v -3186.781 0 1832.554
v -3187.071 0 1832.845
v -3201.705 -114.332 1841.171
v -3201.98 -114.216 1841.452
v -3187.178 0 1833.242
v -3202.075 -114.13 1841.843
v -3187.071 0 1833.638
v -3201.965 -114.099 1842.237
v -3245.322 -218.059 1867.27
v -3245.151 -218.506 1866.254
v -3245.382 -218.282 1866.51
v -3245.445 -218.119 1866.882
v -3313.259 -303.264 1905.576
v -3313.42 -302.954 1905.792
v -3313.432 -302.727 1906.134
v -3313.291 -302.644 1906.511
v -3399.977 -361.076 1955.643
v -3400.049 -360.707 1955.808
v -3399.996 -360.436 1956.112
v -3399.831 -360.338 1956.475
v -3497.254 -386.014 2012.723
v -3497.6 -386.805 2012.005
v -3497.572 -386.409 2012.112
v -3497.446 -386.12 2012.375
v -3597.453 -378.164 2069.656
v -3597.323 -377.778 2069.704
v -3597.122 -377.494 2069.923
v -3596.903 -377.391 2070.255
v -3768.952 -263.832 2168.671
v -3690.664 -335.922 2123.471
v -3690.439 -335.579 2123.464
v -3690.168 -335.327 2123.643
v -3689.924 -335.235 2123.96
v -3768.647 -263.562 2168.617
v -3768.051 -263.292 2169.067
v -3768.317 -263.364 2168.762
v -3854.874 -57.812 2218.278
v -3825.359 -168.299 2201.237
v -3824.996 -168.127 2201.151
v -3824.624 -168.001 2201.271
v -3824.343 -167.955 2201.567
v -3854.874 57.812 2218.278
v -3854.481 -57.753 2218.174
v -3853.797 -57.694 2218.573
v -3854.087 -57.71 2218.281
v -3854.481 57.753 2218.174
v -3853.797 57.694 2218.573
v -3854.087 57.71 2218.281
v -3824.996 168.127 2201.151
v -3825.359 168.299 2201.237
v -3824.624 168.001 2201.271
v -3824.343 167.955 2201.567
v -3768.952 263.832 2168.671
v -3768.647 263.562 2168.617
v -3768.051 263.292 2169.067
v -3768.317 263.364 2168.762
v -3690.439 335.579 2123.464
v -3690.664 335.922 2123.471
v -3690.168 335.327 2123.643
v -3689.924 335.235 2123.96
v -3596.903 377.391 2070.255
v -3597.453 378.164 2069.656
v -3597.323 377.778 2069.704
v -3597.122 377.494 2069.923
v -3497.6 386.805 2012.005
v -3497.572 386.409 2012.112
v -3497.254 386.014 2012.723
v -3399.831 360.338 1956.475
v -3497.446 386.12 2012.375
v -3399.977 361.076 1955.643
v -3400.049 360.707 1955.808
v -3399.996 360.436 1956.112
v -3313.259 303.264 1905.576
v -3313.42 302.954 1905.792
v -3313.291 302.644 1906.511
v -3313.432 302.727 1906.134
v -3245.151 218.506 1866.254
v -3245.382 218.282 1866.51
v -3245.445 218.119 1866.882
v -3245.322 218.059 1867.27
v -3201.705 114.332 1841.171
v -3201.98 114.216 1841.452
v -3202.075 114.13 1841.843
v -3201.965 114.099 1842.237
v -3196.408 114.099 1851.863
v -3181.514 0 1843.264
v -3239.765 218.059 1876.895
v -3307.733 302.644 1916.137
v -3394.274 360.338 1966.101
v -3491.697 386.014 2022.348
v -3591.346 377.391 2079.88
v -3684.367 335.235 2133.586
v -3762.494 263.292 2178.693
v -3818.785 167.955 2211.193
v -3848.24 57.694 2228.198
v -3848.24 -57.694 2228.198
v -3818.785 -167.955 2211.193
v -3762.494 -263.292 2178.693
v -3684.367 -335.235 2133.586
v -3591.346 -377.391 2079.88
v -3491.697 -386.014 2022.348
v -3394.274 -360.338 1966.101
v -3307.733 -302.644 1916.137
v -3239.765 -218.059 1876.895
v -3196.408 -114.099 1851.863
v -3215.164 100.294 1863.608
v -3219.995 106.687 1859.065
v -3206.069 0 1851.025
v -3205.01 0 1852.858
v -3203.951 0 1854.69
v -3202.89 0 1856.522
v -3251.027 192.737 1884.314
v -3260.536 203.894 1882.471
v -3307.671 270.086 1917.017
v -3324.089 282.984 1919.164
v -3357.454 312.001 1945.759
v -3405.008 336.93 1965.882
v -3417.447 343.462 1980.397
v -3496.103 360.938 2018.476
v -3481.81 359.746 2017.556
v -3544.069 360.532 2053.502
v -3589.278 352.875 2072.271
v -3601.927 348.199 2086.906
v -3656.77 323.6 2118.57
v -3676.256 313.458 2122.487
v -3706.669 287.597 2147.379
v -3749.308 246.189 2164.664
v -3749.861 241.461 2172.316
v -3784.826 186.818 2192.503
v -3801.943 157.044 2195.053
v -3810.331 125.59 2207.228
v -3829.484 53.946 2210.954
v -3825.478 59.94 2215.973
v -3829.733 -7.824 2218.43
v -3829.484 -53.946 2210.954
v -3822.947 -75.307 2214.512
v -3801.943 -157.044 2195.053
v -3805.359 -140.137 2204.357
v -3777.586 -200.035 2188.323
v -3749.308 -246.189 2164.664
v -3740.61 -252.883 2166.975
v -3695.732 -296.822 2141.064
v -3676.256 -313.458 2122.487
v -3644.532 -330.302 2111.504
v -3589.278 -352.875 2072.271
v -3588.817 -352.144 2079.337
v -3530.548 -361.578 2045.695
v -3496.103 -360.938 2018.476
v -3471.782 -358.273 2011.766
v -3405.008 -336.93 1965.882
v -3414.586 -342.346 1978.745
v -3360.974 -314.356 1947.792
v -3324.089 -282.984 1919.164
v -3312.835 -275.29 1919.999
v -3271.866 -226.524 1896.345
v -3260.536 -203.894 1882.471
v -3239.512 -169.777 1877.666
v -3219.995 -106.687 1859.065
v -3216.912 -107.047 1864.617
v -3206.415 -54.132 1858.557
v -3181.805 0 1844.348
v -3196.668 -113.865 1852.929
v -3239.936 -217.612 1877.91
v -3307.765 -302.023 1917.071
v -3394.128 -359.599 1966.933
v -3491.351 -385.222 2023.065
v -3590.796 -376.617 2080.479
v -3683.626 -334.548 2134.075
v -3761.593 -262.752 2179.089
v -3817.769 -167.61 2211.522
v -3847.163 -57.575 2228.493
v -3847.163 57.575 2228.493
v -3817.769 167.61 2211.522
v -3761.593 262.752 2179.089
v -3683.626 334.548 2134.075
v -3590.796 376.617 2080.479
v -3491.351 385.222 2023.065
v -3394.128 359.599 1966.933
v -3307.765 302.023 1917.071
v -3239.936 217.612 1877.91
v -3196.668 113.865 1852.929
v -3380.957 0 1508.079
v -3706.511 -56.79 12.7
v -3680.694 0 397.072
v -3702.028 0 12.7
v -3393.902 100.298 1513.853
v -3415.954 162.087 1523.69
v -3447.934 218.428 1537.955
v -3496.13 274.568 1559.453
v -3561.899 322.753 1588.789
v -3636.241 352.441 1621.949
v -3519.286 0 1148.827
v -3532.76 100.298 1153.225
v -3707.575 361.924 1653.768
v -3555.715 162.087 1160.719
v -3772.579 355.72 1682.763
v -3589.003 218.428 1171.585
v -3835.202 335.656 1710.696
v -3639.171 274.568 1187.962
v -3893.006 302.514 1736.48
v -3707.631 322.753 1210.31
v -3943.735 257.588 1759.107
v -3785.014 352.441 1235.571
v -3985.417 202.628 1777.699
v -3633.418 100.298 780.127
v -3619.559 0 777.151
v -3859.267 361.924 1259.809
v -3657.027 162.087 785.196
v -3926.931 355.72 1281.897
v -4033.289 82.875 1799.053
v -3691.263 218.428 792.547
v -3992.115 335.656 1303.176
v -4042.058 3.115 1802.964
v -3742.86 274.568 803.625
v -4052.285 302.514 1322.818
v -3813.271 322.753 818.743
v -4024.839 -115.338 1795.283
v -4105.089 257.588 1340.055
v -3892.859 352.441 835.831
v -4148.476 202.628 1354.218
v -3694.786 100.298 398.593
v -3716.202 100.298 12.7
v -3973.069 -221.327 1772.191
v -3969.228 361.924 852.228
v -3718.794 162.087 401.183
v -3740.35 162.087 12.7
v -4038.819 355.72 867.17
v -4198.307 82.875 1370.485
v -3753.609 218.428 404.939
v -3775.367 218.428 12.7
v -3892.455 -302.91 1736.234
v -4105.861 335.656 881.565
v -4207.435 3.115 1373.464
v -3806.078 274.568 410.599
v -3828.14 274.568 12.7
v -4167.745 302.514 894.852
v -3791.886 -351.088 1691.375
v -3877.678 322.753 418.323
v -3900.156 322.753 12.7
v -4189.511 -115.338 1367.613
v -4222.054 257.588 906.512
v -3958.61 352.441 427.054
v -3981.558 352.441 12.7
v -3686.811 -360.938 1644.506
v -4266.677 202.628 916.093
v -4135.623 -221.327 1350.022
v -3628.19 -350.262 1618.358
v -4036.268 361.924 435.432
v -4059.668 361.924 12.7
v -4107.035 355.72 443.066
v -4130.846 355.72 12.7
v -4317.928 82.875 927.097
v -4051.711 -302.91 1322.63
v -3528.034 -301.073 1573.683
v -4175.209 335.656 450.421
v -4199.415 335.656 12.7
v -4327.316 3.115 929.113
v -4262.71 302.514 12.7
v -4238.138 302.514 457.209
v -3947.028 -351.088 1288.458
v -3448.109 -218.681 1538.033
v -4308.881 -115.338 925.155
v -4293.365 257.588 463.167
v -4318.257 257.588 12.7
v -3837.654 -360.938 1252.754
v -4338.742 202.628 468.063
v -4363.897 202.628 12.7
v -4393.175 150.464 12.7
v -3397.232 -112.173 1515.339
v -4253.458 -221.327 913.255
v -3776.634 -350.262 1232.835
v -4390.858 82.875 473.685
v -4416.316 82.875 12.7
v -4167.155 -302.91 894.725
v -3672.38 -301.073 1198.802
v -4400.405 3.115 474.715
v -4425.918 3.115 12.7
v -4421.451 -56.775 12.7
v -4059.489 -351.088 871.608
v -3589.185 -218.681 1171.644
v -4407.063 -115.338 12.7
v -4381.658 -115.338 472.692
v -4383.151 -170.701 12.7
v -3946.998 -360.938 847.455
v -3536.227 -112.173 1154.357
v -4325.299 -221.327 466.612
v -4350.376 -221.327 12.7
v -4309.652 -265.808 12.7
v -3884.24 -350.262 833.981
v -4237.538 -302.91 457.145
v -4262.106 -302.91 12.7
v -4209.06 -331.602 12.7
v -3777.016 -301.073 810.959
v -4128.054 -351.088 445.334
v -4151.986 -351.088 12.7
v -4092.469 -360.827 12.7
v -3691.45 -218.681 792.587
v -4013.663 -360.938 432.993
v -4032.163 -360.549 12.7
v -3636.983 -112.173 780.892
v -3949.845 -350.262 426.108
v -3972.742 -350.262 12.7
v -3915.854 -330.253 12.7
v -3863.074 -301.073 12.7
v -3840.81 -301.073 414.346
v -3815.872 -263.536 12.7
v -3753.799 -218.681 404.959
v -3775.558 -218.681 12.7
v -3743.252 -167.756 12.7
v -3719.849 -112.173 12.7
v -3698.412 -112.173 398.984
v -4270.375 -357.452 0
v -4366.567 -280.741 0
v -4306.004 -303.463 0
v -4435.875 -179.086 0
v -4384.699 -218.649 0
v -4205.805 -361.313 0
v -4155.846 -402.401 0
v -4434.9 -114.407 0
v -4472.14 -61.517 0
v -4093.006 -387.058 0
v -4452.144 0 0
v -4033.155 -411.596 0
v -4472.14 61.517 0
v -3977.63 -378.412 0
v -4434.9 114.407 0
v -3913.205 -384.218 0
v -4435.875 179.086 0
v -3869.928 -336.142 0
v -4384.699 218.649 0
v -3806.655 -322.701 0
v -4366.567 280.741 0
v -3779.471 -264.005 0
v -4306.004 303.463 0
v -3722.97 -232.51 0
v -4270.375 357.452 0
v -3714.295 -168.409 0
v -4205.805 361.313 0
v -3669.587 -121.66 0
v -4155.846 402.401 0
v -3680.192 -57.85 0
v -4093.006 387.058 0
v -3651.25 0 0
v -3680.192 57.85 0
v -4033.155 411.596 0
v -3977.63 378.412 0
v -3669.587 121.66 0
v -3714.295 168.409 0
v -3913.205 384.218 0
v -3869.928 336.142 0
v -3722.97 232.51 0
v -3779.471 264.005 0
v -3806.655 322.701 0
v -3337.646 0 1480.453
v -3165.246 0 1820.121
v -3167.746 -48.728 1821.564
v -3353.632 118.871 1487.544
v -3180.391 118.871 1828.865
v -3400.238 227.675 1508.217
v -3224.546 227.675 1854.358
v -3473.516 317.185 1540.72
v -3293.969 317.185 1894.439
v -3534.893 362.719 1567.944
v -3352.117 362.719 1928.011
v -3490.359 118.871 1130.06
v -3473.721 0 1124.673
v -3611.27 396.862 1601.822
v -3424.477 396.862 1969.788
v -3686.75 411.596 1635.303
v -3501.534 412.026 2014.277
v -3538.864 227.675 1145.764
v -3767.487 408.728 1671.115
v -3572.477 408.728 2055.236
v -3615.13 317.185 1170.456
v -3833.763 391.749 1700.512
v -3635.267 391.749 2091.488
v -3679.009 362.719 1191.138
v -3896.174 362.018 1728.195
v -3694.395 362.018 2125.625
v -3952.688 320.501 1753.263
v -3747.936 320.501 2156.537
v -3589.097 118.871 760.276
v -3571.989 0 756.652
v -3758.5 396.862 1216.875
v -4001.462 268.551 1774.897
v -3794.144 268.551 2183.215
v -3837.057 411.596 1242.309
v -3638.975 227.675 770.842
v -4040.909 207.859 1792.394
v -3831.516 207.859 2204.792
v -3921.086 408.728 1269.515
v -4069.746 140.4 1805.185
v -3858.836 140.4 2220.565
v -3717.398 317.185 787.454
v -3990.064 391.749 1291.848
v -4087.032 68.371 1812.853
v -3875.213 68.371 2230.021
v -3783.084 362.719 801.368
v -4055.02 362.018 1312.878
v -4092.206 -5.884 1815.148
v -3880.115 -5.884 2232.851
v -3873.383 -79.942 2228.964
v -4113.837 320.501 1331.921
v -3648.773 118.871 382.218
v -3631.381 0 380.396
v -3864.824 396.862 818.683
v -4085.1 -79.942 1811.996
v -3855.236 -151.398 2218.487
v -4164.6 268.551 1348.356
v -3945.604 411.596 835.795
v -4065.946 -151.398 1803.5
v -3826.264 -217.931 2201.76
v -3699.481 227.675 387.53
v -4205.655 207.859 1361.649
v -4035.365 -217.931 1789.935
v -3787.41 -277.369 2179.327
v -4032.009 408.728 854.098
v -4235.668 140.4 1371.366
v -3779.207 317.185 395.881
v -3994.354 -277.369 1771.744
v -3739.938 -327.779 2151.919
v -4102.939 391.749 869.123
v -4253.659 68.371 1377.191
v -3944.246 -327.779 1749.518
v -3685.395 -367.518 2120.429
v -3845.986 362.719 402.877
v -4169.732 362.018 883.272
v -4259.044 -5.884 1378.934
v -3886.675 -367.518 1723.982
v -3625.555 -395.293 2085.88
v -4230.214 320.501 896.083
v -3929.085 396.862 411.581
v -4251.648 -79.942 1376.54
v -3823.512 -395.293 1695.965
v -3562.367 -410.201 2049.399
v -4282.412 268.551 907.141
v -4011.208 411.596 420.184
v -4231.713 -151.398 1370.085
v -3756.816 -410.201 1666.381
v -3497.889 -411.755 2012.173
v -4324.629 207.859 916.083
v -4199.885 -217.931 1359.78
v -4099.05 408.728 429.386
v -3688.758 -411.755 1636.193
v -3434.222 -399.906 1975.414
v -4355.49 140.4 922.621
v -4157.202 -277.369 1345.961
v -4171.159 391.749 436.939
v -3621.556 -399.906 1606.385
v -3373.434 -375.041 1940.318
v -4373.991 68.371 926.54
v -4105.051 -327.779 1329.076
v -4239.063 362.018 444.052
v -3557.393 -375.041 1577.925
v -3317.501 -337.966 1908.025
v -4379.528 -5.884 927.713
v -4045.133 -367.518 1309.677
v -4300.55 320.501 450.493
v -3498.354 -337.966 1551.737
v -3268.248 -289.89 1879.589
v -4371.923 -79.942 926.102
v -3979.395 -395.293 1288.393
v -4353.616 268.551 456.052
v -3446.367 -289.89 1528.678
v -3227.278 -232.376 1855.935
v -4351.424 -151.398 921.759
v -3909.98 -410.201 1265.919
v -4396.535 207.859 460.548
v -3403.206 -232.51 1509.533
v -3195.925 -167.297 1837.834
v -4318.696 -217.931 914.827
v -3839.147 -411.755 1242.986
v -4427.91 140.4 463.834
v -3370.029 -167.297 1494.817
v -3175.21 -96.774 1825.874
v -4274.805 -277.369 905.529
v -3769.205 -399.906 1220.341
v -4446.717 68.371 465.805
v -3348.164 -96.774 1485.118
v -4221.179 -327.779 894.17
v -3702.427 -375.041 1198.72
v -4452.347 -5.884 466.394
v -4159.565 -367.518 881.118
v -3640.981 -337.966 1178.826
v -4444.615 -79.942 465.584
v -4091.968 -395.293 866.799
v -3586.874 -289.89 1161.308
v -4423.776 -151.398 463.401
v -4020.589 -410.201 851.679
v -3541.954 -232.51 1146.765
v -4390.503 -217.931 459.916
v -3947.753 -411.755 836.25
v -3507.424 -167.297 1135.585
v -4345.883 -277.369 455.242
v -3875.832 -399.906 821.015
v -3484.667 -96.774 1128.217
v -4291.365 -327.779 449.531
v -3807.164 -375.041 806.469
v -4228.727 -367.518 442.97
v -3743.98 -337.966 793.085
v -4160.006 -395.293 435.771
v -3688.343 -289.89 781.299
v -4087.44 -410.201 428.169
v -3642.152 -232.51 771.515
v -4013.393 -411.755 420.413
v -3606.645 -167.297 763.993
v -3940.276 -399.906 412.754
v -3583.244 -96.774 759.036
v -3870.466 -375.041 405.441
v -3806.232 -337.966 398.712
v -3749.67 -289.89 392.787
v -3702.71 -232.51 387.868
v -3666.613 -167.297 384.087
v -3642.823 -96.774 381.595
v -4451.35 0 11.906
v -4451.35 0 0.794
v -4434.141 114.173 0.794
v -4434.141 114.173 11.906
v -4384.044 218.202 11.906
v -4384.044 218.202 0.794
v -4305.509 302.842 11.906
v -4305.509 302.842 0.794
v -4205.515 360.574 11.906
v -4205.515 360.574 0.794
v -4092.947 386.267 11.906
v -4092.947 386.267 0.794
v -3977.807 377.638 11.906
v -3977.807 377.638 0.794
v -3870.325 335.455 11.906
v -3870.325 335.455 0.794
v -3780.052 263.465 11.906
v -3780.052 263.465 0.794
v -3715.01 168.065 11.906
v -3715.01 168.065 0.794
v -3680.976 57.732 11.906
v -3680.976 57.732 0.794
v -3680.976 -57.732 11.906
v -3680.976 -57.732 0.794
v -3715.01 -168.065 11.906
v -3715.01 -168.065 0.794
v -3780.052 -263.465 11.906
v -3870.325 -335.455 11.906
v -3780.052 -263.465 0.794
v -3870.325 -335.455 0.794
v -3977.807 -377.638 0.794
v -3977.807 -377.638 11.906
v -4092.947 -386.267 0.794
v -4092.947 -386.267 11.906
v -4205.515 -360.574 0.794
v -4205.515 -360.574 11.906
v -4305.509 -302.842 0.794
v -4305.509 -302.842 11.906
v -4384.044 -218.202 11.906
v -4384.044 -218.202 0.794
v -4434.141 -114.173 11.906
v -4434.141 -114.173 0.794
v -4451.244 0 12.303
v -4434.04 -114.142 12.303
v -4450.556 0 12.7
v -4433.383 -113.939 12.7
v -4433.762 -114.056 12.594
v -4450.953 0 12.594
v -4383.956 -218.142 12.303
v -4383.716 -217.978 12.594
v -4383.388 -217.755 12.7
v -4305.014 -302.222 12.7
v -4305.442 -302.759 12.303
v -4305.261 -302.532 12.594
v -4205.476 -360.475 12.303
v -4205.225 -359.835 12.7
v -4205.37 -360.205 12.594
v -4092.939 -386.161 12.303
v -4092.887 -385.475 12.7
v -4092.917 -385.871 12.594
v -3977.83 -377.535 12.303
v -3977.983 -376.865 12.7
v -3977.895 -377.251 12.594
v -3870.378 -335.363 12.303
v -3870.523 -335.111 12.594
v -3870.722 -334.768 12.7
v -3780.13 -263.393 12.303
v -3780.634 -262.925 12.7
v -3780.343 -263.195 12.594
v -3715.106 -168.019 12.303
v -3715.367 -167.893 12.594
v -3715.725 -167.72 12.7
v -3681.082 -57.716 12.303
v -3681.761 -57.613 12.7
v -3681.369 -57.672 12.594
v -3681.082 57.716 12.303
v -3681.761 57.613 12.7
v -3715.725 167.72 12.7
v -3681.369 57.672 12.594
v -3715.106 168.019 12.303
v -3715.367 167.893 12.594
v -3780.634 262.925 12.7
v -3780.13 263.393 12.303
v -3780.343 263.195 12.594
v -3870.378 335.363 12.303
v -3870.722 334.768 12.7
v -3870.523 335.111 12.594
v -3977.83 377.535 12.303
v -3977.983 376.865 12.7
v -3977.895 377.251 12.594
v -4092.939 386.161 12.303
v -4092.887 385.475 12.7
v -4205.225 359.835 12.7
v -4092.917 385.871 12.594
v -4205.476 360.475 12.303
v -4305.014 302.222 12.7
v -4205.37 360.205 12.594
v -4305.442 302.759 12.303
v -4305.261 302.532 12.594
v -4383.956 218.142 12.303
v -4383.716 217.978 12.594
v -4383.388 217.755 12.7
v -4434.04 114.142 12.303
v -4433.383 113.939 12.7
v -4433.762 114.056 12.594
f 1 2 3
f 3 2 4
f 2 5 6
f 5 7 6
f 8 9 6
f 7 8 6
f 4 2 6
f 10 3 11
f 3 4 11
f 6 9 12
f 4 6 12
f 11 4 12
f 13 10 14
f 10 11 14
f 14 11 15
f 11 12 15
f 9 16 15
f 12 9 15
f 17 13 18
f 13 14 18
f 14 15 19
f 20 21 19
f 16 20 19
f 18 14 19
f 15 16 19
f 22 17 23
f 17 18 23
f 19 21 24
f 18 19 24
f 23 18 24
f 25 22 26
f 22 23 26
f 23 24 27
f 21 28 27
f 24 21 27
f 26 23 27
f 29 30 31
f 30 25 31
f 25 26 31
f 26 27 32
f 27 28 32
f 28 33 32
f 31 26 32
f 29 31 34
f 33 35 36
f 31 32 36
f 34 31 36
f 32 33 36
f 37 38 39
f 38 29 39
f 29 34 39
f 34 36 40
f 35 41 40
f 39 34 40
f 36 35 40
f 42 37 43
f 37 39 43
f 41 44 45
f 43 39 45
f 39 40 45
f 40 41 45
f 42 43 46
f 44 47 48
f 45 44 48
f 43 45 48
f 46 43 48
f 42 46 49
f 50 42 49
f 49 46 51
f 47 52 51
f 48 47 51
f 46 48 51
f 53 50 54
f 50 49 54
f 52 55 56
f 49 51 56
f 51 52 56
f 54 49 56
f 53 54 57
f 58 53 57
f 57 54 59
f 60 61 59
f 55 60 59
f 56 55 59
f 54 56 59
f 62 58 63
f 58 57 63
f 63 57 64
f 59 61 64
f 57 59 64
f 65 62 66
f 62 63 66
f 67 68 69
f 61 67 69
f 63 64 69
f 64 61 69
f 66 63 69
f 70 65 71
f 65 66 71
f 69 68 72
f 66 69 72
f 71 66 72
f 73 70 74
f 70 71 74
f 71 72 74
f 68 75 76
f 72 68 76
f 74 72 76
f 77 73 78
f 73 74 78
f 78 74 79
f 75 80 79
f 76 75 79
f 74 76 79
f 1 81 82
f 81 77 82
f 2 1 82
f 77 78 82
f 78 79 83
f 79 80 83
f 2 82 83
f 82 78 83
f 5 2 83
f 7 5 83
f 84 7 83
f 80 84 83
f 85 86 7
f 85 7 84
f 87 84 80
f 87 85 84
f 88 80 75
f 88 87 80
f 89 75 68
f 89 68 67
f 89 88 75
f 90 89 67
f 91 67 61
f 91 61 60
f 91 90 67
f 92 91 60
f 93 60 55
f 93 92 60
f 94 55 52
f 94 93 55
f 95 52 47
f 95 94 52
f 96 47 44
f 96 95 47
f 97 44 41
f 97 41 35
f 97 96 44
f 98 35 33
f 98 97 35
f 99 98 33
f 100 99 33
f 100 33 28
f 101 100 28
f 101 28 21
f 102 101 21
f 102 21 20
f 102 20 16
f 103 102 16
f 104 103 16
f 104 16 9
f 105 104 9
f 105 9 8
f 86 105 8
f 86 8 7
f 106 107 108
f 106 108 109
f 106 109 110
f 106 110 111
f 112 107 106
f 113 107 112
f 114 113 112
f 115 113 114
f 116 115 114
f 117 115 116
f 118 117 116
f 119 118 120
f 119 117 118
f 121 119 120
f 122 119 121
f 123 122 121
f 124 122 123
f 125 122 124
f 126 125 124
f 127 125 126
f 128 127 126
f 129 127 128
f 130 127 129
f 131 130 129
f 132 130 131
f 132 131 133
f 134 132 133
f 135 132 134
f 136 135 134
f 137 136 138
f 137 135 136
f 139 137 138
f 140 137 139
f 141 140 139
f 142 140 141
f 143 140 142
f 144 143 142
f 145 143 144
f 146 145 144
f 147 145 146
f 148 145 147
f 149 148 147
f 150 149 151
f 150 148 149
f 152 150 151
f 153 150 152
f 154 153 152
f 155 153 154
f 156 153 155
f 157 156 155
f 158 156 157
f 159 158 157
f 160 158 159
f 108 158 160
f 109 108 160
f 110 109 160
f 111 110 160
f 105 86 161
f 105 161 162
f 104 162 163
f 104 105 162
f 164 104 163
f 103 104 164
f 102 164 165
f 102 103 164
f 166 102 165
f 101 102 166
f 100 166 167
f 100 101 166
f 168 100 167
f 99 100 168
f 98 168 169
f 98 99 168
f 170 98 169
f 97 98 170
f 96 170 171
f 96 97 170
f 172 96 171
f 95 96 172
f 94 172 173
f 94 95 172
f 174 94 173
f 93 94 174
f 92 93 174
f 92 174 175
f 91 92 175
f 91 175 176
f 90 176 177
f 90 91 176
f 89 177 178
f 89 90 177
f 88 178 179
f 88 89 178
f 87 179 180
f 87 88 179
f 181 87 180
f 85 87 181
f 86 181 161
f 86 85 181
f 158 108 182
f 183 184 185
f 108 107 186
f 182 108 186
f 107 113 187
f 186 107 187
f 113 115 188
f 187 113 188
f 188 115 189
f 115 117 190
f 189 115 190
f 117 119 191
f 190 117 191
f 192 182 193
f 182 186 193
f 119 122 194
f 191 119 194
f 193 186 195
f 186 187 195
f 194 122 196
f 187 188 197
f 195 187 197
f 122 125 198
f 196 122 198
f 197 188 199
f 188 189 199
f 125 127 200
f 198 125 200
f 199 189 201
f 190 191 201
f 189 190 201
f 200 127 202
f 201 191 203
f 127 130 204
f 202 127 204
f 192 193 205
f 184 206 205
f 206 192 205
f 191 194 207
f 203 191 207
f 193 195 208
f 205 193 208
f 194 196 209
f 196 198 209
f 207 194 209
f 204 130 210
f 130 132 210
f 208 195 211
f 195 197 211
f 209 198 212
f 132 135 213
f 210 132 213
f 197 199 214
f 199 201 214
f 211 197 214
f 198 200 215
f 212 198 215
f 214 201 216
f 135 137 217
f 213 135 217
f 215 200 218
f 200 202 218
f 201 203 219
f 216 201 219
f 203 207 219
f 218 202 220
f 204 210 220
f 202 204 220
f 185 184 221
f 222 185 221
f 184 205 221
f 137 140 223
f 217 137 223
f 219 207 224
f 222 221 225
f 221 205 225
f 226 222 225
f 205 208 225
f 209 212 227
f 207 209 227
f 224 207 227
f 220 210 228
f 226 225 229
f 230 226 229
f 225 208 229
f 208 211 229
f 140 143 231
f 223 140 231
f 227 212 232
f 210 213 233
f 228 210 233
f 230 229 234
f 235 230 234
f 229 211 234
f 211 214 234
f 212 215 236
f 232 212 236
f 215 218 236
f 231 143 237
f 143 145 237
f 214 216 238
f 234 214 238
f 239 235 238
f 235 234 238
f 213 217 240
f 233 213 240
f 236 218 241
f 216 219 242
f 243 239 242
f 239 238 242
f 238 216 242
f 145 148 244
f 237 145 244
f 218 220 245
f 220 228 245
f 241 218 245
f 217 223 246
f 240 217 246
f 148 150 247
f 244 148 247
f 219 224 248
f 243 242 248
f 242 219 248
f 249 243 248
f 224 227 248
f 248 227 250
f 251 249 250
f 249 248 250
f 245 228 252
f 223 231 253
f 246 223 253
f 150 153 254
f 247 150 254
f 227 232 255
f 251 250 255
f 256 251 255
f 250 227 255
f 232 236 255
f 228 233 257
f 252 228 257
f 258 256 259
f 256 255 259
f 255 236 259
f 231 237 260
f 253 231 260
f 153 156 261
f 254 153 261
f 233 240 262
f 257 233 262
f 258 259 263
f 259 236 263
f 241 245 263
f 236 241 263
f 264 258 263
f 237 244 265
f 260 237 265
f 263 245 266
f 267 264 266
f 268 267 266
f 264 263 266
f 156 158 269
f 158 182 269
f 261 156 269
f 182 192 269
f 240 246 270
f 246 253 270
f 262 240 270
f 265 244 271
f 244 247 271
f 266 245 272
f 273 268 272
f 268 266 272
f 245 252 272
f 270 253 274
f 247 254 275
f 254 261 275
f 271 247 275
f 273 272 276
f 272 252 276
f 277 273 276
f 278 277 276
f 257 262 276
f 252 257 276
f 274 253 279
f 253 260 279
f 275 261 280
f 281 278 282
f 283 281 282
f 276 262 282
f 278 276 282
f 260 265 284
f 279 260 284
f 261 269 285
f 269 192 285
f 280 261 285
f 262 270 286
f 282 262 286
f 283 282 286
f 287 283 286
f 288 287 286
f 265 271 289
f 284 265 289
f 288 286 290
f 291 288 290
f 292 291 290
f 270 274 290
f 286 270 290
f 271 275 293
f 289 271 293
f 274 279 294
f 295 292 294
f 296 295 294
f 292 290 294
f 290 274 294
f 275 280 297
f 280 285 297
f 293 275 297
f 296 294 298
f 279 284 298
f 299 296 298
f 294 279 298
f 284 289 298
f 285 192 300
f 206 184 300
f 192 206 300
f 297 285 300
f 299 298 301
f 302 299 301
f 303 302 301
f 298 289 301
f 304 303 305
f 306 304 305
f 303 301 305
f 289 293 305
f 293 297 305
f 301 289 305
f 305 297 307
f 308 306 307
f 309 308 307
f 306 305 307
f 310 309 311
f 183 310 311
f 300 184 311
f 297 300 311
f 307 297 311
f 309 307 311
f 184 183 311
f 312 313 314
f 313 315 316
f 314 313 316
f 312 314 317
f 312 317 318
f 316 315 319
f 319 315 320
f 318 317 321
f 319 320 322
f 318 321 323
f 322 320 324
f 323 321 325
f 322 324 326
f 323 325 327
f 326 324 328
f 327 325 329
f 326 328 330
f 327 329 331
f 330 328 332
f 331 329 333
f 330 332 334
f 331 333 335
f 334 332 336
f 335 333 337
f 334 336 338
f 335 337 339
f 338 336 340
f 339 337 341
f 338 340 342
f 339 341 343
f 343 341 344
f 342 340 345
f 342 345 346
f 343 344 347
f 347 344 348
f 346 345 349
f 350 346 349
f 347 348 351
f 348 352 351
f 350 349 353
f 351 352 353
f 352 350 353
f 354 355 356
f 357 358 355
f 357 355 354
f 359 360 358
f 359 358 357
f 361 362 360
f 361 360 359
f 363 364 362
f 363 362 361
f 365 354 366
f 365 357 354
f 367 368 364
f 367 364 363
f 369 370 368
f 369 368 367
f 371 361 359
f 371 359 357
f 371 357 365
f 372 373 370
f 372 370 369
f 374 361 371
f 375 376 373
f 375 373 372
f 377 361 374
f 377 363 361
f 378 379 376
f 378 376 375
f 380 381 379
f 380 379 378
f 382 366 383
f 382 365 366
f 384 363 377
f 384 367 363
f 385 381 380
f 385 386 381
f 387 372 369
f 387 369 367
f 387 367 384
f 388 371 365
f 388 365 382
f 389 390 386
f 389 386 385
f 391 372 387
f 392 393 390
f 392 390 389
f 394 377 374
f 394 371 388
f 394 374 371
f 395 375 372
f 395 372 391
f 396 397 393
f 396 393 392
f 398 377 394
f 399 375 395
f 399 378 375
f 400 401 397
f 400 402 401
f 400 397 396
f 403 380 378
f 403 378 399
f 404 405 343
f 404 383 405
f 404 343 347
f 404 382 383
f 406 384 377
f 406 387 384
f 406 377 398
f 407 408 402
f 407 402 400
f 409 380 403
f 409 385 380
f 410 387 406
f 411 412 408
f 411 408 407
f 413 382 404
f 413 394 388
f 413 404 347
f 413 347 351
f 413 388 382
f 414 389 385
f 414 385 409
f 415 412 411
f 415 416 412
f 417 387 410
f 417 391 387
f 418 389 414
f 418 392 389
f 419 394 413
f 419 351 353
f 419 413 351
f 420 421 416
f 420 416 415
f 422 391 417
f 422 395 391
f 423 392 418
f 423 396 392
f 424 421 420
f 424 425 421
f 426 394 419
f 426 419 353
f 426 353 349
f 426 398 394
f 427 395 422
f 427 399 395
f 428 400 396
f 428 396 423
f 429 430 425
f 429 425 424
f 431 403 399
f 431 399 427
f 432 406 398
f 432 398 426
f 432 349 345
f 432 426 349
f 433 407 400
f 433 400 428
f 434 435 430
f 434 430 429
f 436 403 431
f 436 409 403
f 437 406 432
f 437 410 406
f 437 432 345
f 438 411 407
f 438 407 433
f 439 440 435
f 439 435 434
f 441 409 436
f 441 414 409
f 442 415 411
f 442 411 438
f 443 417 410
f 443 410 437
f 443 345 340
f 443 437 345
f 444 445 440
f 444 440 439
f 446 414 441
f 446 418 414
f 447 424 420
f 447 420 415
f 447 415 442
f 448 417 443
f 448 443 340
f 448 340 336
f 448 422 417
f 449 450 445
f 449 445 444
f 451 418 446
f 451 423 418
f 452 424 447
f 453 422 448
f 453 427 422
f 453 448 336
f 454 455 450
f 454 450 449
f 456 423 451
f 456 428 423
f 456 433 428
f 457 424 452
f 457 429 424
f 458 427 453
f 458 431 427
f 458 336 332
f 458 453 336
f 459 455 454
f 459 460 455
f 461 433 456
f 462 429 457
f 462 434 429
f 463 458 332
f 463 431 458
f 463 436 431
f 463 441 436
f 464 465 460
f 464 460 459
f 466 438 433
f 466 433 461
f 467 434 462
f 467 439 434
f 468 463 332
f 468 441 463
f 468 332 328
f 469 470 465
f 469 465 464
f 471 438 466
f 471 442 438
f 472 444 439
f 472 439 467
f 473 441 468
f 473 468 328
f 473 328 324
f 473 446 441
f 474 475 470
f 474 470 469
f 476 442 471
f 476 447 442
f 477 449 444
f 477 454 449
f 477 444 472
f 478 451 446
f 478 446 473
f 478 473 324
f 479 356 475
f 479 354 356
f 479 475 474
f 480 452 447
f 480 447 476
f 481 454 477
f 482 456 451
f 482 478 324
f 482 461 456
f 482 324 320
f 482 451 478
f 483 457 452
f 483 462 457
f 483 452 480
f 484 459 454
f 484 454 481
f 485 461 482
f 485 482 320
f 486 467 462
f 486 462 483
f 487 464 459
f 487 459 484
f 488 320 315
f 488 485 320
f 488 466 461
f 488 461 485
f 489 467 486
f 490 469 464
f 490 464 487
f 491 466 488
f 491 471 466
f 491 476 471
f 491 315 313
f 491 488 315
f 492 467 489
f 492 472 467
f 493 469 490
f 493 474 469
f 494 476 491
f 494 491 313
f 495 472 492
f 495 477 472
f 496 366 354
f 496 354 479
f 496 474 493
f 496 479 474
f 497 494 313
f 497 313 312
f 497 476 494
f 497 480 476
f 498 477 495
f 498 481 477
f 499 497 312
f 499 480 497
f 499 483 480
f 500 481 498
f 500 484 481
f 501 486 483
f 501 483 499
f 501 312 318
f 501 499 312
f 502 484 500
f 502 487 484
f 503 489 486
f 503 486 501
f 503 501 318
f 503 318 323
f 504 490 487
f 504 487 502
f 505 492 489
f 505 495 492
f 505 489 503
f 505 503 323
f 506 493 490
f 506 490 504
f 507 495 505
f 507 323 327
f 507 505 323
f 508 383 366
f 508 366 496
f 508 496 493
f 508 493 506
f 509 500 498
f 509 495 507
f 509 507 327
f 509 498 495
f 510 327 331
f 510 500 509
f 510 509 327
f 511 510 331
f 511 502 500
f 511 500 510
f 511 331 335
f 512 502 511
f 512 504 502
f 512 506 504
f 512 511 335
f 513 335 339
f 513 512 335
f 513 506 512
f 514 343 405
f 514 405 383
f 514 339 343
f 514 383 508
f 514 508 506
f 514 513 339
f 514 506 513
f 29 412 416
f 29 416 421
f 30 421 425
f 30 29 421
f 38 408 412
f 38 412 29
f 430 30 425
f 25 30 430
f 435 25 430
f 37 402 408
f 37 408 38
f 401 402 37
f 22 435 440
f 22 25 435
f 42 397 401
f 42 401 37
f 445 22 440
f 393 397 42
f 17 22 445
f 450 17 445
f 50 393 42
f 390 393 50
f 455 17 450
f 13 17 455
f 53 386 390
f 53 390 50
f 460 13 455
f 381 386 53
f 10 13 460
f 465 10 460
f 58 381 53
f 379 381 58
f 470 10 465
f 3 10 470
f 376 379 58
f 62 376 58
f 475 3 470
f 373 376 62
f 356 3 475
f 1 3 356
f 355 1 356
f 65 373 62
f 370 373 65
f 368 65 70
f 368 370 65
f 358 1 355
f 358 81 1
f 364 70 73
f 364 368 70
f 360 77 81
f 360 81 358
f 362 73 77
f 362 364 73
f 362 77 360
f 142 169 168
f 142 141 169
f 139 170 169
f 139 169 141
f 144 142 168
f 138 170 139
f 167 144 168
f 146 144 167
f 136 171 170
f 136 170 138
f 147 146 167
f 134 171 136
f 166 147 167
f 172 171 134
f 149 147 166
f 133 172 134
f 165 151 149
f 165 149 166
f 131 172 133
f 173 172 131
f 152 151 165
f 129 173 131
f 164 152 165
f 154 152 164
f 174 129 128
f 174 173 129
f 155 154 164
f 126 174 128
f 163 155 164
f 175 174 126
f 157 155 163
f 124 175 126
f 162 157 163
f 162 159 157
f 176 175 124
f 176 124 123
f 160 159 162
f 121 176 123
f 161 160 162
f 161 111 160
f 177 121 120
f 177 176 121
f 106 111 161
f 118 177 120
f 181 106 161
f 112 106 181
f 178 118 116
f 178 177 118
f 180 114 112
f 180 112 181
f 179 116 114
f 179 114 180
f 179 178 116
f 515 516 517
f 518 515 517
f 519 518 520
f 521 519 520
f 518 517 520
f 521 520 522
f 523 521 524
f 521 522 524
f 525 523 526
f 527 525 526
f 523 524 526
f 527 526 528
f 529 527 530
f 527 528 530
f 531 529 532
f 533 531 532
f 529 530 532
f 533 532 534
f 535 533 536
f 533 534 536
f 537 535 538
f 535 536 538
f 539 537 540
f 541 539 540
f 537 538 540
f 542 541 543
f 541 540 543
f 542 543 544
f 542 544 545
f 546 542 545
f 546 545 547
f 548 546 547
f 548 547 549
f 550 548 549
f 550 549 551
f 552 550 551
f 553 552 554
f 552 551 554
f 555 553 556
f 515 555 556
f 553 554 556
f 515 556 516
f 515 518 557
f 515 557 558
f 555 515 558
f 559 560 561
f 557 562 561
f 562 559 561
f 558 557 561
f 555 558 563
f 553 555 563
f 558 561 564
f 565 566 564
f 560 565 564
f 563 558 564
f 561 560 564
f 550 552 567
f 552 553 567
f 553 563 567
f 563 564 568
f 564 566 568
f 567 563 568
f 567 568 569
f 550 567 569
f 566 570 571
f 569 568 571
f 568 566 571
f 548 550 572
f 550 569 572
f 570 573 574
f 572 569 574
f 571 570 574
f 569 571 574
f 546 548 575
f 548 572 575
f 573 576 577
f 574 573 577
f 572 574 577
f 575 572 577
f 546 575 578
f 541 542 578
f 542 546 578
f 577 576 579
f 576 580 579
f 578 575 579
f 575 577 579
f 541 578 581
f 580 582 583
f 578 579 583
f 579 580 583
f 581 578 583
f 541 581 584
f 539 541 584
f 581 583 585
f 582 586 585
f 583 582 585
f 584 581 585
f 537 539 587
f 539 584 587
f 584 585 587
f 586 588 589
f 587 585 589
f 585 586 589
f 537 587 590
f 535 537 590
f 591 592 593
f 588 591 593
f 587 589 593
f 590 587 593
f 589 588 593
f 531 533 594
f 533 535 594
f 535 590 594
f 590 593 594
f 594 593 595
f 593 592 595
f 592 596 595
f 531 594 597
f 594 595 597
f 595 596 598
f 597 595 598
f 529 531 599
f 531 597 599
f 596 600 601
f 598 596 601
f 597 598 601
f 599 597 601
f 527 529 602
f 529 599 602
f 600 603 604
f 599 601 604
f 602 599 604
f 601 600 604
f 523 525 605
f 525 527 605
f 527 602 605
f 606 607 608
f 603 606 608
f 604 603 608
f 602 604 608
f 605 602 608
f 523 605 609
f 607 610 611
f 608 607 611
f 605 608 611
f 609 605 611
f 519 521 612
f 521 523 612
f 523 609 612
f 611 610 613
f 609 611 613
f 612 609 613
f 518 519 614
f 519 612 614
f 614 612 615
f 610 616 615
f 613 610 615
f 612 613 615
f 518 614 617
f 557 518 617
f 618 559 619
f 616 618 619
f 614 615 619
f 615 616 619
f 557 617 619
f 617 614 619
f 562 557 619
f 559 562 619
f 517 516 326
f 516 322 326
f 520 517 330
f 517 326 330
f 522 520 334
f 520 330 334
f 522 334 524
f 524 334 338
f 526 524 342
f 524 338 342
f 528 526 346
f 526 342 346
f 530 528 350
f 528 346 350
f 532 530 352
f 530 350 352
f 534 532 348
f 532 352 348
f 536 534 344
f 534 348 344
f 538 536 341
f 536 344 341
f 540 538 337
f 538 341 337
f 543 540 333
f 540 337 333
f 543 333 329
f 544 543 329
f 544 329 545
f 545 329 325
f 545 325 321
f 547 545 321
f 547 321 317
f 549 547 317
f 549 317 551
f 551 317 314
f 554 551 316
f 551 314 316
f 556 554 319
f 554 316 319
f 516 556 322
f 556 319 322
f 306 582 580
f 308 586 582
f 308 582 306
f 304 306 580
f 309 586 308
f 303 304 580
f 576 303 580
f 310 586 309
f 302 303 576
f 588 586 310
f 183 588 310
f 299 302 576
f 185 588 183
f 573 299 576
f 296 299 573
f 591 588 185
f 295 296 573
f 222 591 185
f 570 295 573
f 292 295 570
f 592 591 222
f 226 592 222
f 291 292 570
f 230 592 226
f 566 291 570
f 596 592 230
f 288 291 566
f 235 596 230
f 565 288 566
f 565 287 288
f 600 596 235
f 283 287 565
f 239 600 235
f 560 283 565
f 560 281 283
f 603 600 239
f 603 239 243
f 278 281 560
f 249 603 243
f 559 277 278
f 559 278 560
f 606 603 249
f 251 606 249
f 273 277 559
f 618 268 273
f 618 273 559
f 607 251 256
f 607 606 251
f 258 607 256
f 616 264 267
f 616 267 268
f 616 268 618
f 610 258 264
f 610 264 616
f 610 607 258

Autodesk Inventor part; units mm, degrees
ref_plane "YZ Plane" through (0, 0, 0) normal (1, 0, 0) x (0, 1, 0)
ref_plane "XZ Plane" through (0, 0, 0) normal (0, 1, 0) x (-1, 0, 0)
ref_plane "XY Plane" through (0, 0, 0) normal (0, 0, 1) x (1, 0, 0)
sketch "Sketch1" plane through (0, 0, 0) normal (0, 0, 1) x (1, 0, 0)
  circle A0 centre (-4064, 0) radius 361.95
  circle A1 centre (-4064, 0) radius 412.75
  line L0 (0, -577.85) -> (0, 577.85) projected
  point P0 (0, 0)
  dimension "d0" = 723.9
  dimension "d1" = 825.5
  dimension "d2" = 4064
revolve "Revolution1" add sketch "Sketch1" angle 30 about axis through (0, -10, 0) along (0, 1, 0)
sketch "Sketch10" plane through (-4064, 0, 0) normal (0, 0, -1) x (-1, 0, 0)
  circle A0 centre (0, 0) radius 387.35
  circle A1 centre (0, 0) radius 412.75 construction
  point P0 (-4064, 0)
  dimension "d34" = 774.7
extrude "Extrusion9" cut sketch "Sketch10" against normal blind 12.7
sketch "Sketch11" plane through (-3519.5272, 0, 2032) normal (0.5, 0, 0.8660254) x (0.8660254, 0, -0.5)
  circle A0 centre (0, 0) radius 361.95 projected
  circle A1 centre (0, 0) radius 387.096
  circle A2 centre (0, 0) radius 425.45
  line L0 (4064, -595.63) -> (4064, 595.63) projected
  point P0 (4064, 0)
  dimension "d37" = 774.192
  dimension "d38" = 850.9
extrude "Extrusion10" cut sketch "Sketch11" against normal blind 6.35 contours A2
extrude "Extrusion11" add sketch "Sketch11" along normal blind 6.35 contours A0 | A1
revolve "Revolution2" cut sketch "Sketch11" angle 0.5 about axis through (0, -10, 0) along (0, 1, 0) contours A0
fillet "Fillet3" radius 0.7937 2 edges at (-3857.9382, 0, 2220.047) (-3676.65, 0, 12.7)
chamfer "Chamfer3" distance 0.7937 angle 45 2 edges at (-3851.5872, 0, 2231.0473) (-3676.65, 0, 0)
properties part number "A1-19027-100-04 HCWI elbow - male" material "Iron, HCWI"
